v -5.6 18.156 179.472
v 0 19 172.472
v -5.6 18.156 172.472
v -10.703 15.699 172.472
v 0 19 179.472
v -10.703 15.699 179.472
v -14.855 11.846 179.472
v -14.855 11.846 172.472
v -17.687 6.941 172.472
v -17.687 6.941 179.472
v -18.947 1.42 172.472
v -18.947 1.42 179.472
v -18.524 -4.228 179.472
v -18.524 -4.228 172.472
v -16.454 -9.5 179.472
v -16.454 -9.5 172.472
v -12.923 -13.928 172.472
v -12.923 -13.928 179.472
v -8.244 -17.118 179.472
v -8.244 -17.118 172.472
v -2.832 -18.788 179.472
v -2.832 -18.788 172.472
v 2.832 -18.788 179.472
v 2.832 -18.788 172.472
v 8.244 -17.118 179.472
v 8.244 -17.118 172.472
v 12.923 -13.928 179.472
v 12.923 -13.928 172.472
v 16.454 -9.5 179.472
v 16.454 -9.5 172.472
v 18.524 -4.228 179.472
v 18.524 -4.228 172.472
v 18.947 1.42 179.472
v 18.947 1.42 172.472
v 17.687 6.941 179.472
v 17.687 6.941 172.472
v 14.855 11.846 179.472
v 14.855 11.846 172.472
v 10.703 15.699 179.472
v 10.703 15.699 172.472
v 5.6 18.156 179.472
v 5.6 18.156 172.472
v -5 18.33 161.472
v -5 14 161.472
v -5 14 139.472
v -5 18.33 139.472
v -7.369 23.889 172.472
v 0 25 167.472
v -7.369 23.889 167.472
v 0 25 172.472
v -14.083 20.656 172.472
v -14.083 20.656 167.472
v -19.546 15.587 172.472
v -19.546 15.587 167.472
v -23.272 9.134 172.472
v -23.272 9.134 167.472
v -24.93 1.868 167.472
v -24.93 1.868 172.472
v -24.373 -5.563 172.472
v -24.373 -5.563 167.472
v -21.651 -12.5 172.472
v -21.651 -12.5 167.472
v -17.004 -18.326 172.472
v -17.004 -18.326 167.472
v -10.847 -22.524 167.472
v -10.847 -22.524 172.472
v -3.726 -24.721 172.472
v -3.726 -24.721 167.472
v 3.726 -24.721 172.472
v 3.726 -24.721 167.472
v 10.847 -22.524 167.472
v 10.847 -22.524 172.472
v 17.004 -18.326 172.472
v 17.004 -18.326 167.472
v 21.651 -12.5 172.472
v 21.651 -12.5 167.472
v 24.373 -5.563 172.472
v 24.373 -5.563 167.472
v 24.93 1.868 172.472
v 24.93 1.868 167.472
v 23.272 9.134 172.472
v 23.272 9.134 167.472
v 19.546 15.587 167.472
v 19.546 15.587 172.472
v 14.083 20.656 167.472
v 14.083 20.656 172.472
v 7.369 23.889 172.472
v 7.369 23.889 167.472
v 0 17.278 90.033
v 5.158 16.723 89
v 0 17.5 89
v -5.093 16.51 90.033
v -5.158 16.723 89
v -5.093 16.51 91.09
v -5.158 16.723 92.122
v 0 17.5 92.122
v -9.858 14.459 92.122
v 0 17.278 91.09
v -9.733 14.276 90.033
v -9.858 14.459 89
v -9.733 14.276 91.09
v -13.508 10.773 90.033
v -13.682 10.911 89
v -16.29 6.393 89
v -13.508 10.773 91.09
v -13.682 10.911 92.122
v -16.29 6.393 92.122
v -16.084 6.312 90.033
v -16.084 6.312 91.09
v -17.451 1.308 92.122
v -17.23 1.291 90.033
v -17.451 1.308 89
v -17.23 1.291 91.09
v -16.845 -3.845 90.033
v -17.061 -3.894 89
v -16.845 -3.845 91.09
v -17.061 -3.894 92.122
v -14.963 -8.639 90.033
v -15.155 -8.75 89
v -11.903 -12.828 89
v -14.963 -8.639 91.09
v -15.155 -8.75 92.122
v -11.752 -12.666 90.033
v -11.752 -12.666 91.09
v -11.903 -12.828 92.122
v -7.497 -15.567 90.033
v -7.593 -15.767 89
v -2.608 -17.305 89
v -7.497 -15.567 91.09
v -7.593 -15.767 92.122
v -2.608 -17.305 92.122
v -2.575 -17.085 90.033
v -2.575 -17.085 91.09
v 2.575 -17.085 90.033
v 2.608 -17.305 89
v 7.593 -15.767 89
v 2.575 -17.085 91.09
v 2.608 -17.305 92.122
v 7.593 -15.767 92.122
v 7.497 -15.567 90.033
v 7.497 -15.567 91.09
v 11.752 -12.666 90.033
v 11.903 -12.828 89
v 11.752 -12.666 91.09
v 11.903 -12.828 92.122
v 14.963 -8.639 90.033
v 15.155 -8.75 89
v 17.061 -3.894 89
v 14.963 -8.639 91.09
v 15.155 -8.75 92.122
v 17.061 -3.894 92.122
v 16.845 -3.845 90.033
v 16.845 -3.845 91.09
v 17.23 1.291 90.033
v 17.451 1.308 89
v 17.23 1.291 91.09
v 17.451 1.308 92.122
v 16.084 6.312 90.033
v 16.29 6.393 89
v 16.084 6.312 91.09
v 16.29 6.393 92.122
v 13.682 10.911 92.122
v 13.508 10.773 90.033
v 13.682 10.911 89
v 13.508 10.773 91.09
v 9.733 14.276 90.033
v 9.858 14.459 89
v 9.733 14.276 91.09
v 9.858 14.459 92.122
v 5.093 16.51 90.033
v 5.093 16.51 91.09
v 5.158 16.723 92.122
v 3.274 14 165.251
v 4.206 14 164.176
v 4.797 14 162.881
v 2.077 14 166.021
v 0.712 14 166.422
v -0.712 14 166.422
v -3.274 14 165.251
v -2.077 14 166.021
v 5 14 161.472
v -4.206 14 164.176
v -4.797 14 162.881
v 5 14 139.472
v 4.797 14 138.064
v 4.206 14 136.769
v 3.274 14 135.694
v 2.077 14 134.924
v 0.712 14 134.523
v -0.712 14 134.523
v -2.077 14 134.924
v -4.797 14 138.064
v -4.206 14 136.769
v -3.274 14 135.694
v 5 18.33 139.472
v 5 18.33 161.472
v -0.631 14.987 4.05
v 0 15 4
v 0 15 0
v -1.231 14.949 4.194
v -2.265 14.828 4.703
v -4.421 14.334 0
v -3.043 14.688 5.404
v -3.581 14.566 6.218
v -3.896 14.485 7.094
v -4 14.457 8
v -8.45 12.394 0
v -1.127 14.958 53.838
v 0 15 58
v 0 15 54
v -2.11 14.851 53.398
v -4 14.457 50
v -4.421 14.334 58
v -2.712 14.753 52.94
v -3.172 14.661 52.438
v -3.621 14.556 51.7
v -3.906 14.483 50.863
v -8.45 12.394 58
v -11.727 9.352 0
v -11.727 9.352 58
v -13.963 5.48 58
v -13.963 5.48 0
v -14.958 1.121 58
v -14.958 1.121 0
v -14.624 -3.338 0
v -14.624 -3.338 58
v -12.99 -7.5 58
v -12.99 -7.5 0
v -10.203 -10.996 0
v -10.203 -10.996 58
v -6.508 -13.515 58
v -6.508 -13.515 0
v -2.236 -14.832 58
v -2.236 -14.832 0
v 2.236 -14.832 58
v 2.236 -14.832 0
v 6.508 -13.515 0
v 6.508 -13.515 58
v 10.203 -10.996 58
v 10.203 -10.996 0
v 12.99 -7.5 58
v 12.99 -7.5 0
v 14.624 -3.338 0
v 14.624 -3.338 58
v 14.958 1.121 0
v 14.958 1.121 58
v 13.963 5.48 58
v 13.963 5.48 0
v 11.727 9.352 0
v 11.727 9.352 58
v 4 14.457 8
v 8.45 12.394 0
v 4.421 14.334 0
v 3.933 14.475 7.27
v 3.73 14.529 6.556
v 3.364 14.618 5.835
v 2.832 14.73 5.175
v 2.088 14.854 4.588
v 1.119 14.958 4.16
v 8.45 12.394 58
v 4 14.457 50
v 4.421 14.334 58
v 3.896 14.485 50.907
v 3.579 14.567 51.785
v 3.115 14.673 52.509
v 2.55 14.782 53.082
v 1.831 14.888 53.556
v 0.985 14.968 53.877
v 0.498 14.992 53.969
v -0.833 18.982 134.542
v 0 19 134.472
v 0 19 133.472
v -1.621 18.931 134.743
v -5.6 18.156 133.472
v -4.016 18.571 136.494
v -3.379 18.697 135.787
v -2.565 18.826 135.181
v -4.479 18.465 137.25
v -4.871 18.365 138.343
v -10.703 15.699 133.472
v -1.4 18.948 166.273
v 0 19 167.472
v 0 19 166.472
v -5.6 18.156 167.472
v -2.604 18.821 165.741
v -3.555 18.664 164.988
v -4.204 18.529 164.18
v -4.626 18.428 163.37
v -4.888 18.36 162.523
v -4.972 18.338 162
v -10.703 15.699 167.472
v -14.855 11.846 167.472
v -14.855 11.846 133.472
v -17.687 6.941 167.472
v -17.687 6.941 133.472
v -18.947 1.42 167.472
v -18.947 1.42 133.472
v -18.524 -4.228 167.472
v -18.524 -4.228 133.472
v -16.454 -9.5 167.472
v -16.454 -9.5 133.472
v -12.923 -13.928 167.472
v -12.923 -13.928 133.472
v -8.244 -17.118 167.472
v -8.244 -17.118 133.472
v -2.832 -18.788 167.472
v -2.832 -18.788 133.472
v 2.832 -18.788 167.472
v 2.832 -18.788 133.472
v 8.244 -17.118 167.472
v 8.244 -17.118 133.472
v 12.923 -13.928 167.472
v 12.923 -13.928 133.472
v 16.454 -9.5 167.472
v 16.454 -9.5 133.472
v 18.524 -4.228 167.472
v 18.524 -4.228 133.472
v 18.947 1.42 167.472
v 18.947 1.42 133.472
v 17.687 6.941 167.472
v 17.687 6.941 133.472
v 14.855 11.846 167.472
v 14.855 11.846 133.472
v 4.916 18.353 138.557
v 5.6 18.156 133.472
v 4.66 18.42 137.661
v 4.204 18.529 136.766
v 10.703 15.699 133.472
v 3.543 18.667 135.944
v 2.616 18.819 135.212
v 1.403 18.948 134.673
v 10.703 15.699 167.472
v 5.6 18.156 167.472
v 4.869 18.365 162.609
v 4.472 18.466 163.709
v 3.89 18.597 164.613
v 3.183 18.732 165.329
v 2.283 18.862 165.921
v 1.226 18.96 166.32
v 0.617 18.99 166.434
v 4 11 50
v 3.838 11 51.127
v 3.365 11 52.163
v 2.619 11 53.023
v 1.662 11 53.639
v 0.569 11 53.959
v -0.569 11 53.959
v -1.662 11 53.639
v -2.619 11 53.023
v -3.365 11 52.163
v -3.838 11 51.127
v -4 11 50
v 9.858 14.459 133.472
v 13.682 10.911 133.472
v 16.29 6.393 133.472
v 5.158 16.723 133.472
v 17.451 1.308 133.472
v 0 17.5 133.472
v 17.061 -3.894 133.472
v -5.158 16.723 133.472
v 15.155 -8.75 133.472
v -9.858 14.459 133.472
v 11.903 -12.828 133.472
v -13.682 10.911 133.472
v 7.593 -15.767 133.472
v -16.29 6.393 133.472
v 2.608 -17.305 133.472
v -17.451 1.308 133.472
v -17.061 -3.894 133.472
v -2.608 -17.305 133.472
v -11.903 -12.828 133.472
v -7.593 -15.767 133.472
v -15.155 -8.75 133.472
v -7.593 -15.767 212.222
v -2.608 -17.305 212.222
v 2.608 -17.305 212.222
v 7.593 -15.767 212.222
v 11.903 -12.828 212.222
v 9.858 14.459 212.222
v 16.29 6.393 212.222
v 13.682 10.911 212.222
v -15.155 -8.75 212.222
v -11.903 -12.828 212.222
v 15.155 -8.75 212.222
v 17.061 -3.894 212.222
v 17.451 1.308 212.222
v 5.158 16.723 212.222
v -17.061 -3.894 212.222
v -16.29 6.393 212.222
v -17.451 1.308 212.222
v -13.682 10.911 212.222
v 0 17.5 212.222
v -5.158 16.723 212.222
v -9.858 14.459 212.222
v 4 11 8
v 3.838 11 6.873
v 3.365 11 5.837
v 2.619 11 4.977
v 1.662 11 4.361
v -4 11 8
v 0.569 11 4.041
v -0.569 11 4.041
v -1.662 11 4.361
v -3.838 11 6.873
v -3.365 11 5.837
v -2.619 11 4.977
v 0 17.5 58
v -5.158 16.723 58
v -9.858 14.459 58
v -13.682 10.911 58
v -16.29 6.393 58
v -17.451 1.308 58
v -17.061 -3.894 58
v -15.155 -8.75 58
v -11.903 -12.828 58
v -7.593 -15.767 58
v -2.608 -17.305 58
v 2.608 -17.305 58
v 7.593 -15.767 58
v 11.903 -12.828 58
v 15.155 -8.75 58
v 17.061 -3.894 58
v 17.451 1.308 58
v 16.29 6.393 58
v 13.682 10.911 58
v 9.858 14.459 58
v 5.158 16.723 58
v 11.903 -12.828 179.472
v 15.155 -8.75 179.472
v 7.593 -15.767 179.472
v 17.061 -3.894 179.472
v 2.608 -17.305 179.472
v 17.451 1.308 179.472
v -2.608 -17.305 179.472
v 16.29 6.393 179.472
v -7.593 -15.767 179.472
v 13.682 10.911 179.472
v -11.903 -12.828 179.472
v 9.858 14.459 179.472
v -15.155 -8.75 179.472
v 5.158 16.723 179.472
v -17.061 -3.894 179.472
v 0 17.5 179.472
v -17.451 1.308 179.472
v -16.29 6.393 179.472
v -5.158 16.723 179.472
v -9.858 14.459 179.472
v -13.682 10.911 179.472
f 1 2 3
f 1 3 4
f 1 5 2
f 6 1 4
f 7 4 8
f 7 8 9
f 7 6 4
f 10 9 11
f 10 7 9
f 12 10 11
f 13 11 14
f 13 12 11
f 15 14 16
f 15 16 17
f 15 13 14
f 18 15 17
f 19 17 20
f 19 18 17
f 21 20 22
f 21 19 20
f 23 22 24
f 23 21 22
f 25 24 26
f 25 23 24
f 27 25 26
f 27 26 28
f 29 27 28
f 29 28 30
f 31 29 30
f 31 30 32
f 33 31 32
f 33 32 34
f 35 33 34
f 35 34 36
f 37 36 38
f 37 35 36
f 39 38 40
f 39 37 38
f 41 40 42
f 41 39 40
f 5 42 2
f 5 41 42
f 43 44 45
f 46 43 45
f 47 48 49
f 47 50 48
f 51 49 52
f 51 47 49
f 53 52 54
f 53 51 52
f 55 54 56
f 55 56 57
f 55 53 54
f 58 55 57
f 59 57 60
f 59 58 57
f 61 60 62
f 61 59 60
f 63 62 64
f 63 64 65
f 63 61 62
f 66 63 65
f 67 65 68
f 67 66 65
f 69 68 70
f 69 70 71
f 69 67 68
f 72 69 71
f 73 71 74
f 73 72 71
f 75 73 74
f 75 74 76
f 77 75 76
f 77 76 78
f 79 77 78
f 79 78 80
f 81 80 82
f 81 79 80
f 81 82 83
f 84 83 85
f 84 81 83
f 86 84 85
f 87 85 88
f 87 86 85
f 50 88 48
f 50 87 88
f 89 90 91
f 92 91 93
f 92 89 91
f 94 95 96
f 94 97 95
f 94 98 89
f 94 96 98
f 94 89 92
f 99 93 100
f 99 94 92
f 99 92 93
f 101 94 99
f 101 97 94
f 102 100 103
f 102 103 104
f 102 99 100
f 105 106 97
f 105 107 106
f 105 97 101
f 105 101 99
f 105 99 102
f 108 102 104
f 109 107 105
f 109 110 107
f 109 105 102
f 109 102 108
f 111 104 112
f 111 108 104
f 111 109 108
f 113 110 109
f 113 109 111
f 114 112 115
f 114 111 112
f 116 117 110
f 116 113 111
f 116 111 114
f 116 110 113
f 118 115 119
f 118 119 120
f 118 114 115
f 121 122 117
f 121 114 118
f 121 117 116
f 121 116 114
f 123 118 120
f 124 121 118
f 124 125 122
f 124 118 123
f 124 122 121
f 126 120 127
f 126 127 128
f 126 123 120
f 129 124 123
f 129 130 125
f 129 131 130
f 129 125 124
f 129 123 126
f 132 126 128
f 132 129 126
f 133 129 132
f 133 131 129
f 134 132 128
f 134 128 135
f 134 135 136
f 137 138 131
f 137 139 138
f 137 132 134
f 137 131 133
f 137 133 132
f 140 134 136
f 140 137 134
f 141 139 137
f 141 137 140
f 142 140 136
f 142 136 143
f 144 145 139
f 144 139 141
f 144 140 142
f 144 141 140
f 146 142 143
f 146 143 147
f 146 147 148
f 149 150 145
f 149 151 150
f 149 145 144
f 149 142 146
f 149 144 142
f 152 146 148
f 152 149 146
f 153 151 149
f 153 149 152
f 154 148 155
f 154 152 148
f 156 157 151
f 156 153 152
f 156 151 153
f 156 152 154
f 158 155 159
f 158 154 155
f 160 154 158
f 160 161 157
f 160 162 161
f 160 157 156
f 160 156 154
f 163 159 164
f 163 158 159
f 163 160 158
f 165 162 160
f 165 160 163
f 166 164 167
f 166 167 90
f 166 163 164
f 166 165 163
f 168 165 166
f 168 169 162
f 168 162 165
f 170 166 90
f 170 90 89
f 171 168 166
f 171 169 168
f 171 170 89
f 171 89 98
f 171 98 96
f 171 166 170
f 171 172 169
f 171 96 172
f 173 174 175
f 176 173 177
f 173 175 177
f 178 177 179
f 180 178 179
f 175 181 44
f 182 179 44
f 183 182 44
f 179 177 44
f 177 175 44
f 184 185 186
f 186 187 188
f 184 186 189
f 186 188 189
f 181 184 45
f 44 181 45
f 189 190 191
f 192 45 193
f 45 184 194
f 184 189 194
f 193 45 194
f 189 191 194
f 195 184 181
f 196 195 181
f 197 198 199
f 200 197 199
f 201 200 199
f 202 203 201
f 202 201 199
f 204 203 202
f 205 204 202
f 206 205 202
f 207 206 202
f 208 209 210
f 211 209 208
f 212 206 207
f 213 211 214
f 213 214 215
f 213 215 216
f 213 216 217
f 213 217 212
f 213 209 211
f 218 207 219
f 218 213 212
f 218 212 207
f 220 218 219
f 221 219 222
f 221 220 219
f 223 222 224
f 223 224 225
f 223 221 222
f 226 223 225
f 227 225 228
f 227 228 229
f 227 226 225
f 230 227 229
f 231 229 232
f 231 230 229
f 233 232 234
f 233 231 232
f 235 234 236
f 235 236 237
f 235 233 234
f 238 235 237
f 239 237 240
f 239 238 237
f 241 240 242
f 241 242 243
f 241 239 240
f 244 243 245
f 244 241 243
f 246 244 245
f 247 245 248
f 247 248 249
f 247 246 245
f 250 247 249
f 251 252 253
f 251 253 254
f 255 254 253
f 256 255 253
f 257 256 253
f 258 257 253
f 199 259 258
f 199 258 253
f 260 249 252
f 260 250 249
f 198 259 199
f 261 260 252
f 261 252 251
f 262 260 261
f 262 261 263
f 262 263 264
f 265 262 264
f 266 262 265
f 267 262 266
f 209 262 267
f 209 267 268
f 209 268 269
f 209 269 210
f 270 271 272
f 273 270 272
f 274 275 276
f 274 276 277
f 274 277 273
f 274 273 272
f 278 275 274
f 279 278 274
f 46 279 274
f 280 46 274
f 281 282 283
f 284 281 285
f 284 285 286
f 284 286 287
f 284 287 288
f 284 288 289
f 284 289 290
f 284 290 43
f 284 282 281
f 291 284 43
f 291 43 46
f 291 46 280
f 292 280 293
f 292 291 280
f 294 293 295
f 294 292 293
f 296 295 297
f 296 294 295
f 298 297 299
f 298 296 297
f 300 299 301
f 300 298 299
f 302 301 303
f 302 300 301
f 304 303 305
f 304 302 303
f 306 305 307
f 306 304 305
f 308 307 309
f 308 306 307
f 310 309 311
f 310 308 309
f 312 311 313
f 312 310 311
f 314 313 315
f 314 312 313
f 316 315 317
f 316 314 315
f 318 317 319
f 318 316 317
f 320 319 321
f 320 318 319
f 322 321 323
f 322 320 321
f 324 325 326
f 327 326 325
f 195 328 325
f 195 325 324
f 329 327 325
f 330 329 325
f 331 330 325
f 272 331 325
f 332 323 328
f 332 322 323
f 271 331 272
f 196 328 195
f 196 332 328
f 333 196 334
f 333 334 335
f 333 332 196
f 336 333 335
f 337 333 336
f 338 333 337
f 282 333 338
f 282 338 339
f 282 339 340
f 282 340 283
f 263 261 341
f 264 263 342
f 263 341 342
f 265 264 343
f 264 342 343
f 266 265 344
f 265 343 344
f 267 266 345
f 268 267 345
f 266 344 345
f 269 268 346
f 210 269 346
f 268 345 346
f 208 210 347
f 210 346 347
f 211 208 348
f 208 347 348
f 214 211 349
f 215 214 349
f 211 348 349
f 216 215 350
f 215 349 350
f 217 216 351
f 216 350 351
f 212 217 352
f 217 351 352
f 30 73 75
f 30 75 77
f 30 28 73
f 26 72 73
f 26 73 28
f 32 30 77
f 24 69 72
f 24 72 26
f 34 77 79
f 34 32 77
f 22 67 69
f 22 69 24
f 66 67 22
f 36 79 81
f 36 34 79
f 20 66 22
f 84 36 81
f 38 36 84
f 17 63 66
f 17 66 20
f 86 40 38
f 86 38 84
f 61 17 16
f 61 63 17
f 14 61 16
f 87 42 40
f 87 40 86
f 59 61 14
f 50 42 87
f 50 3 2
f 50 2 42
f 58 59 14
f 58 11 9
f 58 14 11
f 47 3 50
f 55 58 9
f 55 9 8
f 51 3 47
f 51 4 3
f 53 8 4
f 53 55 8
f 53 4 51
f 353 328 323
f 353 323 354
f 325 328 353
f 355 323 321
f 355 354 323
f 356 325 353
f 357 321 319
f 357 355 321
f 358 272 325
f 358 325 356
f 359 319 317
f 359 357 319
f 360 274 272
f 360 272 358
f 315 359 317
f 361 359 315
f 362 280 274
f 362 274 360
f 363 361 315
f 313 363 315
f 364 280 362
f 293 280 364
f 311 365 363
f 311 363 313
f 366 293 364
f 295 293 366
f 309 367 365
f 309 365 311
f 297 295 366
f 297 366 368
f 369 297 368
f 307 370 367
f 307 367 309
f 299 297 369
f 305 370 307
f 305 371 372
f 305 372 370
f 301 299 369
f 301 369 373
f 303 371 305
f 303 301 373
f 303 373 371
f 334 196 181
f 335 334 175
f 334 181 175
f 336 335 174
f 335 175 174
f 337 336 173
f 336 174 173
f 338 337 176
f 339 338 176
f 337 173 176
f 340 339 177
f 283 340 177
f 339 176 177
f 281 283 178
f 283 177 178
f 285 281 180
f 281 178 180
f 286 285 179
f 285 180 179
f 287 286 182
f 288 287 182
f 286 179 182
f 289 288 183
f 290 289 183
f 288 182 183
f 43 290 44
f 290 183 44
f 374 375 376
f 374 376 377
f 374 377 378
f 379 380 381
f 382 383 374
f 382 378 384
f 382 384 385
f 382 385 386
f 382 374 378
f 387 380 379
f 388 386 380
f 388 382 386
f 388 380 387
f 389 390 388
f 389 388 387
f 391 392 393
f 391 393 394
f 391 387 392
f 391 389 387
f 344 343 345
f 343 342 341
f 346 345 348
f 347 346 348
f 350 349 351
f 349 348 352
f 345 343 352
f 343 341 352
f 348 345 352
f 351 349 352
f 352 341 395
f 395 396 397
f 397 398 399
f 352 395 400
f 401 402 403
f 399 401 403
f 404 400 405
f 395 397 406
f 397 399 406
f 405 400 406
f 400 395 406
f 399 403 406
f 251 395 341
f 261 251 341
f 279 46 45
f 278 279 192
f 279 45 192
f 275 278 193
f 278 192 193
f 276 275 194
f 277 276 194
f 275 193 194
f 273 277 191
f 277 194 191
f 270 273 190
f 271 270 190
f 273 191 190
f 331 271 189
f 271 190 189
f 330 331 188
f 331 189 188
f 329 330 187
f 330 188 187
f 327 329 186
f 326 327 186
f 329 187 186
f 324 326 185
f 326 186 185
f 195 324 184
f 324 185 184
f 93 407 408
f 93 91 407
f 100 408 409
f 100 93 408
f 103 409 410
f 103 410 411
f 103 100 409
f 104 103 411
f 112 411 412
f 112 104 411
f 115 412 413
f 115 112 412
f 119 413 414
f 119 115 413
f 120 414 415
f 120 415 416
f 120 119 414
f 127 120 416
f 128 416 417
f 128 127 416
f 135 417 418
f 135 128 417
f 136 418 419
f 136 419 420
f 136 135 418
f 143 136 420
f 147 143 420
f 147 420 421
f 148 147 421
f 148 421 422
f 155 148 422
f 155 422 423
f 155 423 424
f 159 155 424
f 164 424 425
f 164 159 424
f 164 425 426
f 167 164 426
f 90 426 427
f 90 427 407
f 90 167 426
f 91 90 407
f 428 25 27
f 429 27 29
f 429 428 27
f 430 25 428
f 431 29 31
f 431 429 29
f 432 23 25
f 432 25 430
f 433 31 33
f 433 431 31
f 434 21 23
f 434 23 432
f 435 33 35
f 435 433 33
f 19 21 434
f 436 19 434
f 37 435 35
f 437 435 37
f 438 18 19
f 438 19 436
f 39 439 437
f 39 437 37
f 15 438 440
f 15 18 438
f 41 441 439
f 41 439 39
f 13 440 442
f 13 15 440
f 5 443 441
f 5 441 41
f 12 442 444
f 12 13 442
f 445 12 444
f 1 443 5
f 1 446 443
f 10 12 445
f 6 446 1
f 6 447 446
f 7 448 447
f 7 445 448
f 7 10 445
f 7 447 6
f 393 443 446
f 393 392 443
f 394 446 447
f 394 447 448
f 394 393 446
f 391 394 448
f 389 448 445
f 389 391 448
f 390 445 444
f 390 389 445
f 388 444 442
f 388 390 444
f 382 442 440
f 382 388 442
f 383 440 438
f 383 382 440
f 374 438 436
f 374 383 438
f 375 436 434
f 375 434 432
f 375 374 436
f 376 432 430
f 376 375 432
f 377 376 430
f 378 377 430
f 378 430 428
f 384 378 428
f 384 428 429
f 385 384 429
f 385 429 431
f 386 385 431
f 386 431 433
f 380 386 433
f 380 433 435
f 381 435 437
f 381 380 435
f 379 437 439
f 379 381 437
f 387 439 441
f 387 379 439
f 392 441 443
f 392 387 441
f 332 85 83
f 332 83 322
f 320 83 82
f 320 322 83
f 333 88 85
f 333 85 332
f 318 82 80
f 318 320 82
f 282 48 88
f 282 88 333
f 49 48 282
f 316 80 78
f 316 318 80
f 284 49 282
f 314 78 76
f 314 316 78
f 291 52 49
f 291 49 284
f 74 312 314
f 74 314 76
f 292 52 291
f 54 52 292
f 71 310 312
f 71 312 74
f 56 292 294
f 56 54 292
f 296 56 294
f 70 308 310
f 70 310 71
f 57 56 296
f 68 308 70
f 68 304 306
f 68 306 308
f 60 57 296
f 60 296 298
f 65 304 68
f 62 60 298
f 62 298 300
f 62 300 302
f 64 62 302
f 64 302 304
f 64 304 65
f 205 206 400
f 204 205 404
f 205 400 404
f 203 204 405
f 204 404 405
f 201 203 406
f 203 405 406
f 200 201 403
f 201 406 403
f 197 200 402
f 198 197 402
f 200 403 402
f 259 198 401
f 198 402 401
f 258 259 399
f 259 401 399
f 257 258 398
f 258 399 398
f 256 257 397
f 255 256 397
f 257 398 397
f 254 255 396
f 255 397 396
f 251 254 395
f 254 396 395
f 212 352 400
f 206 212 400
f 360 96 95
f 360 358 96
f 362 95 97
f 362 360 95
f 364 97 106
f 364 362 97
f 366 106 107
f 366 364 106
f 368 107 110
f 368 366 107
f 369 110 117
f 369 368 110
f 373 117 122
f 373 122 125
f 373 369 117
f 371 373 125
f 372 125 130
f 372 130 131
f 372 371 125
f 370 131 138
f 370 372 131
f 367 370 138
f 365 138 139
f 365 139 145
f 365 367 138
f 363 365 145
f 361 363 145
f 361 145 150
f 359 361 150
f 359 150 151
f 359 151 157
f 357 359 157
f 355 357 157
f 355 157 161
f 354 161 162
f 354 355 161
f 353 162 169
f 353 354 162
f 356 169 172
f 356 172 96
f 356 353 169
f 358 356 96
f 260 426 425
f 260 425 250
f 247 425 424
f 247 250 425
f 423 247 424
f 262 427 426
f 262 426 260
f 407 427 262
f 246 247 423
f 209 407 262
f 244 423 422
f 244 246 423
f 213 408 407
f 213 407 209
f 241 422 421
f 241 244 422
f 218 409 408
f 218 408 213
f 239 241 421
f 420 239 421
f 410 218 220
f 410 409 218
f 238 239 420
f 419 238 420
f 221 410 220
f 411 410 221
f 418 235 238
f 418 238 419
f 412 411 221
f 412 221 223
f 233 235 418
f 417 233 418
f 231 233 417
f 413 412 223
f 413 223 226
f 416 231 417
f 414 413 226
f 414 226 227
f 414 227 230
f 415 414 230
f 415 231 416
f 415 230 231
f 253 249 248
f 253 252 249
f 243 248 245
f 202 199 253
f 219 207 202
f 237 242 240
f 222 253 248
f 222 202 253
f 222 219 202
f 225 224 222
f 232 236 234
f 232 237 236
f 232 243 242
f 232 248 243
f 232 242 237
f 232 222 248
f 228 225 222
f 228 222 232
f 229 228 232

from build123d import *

# Parameters (mm, degrees)
CUT_EXTRUDE1_REACH      = 219.22
CUT_EXTRUDE1_END_RADIUS = 19
CUT_EXTRUDE2_REACH      = 218.701
CUT_EXTRUDE2_END_RADIUS = 15


with BuildPart() as part:
    # Sketch1 → Revolve1 (revolve)
    with BuildSketch(Plane(origin=(0, 0, 0), x_dir=(0, 0, -1), z_dir=(1, 0, 0))):
        with BuildLine():
            Line((0, 0), (0, 15))
            Line((0, 15), (-58, 15))
            Line((-58, 15), (-58, 17.5))
            Line((-58, 17.5), (-89, 17.5))
            ThreePointArc((-89, 17.5), (-90.5612495, 17.25), (-92.122498999, 17.5))
            Line((-92.122498999, 17.5), (-133.472498999, 17.5))
            Line((-133.472498999, 17.5), (-133.472498999, 19))
            Line((-133.472498999, 19), (-167.472498999, 19))
            Line((-167.472498999, 19), (-167.472498999, 25))
            Line((-167.472498999, 25), (-172.472498999, 25))
            Line((-172.472498999, 25), (-172.472498999, 19))
            Line((-172.472498999, 19), (-179.472498999, 19))
            Line((-179.472498999, 19), (-179.472498999, 17.5))
            Line((-179.472498999, 17.5), (-212.222498999, 17.5))
            Line((-212.222498999, 17.5), (-212.222498999, 0))
            Line((-212.222498999, 0), (0, 0))
        make_face()
    revolve(axis=Axis((0, 0, 0), (0, 0, 1)))

    # Cut-Extrude1: up to this cylinder (the profile starts inside it)
    cut_extrude1_end = Plane(origin=(0, 0, 150.472499), z_dir=(0, 0, -1)) * Cylinder(CUT_EXTRUDE1_END_RADIUS, 477.44, mode=Mode.PRIVATE)
    # Sketch2 → Cut-Extrude1 (cut, up to the surface)
    with BuildSketch(Plane(origin=(0, 14, 0), x_dir=(1, 0, 0), z_dir=(0, 1, 0)), mode=Mode.PRIVATE) as cut_extrude1_sk1:
        with BuildLine():
            Line((5, -139.472498999), (5, -161.472498999))
            ThreePointArc((5, -161.472498999), (0, -166.472498999), (-5, -161.472498999))
            Line((-5, -161.472498999), (-5, -139.472498999))
            ThreePointArc((-5, -139.472498999), (0, -134.472498999), (5, -139.472498999))
        make_face()
    cut_extrude1_tool1 = extrude(cut_extrude1_sk1.sketch, amount=CUT_EXTRUDE1_REACH, mode=Mode.PRIVATE) & cut_extrude1_end
    add(cut_extrude1_tool1.solids().sort_by_distance((0, 14, 150.472499))[0], mode=Mode.SUBTRACT)

    # Cut-Extrude2: up to this cylinder (the profile starts inside it)
    cut_extrude2_end = Plane(origin=(0, 0, 29), z_dir=(0, 0, -1)) * Cylinder(CUT_EXTRUDE2_END_RADIUS, 468.402, mode=Mode.PRIVATE)
    # Sketch3 → Cut-Extrude2 (cut, up to the surface)
    with BuildSketch(Plane(origin=(0, 11, 0), x_dir=(1, 0, 0), z_dir=(0, 1, 0)), mode=Mode.PRIVATE) as cut_extrude2_sk1:
        with BuildLine():
            Line((-4, -50), (-4, -8))
            ThreePointArc((-4, -8), (0, -4), (4, -8))
            Line((4, -8), (4, -50))
            ThreePointArc((4, -50), (0, -54), (-4, -50))
        make_face()
    cut_extrude2_tool1 = extrude(cut_extrude2_sk1.sketch, amount=CUT_EXTRUDE2_REACH, mode=Mode.PRIVATE) & cut_extrude2_end
    add(cut_extrude2_tool1.solids().sort_by_distance((0, 11, 29))[0], mode=Mode.SUBTRACT)


solid = part.part
